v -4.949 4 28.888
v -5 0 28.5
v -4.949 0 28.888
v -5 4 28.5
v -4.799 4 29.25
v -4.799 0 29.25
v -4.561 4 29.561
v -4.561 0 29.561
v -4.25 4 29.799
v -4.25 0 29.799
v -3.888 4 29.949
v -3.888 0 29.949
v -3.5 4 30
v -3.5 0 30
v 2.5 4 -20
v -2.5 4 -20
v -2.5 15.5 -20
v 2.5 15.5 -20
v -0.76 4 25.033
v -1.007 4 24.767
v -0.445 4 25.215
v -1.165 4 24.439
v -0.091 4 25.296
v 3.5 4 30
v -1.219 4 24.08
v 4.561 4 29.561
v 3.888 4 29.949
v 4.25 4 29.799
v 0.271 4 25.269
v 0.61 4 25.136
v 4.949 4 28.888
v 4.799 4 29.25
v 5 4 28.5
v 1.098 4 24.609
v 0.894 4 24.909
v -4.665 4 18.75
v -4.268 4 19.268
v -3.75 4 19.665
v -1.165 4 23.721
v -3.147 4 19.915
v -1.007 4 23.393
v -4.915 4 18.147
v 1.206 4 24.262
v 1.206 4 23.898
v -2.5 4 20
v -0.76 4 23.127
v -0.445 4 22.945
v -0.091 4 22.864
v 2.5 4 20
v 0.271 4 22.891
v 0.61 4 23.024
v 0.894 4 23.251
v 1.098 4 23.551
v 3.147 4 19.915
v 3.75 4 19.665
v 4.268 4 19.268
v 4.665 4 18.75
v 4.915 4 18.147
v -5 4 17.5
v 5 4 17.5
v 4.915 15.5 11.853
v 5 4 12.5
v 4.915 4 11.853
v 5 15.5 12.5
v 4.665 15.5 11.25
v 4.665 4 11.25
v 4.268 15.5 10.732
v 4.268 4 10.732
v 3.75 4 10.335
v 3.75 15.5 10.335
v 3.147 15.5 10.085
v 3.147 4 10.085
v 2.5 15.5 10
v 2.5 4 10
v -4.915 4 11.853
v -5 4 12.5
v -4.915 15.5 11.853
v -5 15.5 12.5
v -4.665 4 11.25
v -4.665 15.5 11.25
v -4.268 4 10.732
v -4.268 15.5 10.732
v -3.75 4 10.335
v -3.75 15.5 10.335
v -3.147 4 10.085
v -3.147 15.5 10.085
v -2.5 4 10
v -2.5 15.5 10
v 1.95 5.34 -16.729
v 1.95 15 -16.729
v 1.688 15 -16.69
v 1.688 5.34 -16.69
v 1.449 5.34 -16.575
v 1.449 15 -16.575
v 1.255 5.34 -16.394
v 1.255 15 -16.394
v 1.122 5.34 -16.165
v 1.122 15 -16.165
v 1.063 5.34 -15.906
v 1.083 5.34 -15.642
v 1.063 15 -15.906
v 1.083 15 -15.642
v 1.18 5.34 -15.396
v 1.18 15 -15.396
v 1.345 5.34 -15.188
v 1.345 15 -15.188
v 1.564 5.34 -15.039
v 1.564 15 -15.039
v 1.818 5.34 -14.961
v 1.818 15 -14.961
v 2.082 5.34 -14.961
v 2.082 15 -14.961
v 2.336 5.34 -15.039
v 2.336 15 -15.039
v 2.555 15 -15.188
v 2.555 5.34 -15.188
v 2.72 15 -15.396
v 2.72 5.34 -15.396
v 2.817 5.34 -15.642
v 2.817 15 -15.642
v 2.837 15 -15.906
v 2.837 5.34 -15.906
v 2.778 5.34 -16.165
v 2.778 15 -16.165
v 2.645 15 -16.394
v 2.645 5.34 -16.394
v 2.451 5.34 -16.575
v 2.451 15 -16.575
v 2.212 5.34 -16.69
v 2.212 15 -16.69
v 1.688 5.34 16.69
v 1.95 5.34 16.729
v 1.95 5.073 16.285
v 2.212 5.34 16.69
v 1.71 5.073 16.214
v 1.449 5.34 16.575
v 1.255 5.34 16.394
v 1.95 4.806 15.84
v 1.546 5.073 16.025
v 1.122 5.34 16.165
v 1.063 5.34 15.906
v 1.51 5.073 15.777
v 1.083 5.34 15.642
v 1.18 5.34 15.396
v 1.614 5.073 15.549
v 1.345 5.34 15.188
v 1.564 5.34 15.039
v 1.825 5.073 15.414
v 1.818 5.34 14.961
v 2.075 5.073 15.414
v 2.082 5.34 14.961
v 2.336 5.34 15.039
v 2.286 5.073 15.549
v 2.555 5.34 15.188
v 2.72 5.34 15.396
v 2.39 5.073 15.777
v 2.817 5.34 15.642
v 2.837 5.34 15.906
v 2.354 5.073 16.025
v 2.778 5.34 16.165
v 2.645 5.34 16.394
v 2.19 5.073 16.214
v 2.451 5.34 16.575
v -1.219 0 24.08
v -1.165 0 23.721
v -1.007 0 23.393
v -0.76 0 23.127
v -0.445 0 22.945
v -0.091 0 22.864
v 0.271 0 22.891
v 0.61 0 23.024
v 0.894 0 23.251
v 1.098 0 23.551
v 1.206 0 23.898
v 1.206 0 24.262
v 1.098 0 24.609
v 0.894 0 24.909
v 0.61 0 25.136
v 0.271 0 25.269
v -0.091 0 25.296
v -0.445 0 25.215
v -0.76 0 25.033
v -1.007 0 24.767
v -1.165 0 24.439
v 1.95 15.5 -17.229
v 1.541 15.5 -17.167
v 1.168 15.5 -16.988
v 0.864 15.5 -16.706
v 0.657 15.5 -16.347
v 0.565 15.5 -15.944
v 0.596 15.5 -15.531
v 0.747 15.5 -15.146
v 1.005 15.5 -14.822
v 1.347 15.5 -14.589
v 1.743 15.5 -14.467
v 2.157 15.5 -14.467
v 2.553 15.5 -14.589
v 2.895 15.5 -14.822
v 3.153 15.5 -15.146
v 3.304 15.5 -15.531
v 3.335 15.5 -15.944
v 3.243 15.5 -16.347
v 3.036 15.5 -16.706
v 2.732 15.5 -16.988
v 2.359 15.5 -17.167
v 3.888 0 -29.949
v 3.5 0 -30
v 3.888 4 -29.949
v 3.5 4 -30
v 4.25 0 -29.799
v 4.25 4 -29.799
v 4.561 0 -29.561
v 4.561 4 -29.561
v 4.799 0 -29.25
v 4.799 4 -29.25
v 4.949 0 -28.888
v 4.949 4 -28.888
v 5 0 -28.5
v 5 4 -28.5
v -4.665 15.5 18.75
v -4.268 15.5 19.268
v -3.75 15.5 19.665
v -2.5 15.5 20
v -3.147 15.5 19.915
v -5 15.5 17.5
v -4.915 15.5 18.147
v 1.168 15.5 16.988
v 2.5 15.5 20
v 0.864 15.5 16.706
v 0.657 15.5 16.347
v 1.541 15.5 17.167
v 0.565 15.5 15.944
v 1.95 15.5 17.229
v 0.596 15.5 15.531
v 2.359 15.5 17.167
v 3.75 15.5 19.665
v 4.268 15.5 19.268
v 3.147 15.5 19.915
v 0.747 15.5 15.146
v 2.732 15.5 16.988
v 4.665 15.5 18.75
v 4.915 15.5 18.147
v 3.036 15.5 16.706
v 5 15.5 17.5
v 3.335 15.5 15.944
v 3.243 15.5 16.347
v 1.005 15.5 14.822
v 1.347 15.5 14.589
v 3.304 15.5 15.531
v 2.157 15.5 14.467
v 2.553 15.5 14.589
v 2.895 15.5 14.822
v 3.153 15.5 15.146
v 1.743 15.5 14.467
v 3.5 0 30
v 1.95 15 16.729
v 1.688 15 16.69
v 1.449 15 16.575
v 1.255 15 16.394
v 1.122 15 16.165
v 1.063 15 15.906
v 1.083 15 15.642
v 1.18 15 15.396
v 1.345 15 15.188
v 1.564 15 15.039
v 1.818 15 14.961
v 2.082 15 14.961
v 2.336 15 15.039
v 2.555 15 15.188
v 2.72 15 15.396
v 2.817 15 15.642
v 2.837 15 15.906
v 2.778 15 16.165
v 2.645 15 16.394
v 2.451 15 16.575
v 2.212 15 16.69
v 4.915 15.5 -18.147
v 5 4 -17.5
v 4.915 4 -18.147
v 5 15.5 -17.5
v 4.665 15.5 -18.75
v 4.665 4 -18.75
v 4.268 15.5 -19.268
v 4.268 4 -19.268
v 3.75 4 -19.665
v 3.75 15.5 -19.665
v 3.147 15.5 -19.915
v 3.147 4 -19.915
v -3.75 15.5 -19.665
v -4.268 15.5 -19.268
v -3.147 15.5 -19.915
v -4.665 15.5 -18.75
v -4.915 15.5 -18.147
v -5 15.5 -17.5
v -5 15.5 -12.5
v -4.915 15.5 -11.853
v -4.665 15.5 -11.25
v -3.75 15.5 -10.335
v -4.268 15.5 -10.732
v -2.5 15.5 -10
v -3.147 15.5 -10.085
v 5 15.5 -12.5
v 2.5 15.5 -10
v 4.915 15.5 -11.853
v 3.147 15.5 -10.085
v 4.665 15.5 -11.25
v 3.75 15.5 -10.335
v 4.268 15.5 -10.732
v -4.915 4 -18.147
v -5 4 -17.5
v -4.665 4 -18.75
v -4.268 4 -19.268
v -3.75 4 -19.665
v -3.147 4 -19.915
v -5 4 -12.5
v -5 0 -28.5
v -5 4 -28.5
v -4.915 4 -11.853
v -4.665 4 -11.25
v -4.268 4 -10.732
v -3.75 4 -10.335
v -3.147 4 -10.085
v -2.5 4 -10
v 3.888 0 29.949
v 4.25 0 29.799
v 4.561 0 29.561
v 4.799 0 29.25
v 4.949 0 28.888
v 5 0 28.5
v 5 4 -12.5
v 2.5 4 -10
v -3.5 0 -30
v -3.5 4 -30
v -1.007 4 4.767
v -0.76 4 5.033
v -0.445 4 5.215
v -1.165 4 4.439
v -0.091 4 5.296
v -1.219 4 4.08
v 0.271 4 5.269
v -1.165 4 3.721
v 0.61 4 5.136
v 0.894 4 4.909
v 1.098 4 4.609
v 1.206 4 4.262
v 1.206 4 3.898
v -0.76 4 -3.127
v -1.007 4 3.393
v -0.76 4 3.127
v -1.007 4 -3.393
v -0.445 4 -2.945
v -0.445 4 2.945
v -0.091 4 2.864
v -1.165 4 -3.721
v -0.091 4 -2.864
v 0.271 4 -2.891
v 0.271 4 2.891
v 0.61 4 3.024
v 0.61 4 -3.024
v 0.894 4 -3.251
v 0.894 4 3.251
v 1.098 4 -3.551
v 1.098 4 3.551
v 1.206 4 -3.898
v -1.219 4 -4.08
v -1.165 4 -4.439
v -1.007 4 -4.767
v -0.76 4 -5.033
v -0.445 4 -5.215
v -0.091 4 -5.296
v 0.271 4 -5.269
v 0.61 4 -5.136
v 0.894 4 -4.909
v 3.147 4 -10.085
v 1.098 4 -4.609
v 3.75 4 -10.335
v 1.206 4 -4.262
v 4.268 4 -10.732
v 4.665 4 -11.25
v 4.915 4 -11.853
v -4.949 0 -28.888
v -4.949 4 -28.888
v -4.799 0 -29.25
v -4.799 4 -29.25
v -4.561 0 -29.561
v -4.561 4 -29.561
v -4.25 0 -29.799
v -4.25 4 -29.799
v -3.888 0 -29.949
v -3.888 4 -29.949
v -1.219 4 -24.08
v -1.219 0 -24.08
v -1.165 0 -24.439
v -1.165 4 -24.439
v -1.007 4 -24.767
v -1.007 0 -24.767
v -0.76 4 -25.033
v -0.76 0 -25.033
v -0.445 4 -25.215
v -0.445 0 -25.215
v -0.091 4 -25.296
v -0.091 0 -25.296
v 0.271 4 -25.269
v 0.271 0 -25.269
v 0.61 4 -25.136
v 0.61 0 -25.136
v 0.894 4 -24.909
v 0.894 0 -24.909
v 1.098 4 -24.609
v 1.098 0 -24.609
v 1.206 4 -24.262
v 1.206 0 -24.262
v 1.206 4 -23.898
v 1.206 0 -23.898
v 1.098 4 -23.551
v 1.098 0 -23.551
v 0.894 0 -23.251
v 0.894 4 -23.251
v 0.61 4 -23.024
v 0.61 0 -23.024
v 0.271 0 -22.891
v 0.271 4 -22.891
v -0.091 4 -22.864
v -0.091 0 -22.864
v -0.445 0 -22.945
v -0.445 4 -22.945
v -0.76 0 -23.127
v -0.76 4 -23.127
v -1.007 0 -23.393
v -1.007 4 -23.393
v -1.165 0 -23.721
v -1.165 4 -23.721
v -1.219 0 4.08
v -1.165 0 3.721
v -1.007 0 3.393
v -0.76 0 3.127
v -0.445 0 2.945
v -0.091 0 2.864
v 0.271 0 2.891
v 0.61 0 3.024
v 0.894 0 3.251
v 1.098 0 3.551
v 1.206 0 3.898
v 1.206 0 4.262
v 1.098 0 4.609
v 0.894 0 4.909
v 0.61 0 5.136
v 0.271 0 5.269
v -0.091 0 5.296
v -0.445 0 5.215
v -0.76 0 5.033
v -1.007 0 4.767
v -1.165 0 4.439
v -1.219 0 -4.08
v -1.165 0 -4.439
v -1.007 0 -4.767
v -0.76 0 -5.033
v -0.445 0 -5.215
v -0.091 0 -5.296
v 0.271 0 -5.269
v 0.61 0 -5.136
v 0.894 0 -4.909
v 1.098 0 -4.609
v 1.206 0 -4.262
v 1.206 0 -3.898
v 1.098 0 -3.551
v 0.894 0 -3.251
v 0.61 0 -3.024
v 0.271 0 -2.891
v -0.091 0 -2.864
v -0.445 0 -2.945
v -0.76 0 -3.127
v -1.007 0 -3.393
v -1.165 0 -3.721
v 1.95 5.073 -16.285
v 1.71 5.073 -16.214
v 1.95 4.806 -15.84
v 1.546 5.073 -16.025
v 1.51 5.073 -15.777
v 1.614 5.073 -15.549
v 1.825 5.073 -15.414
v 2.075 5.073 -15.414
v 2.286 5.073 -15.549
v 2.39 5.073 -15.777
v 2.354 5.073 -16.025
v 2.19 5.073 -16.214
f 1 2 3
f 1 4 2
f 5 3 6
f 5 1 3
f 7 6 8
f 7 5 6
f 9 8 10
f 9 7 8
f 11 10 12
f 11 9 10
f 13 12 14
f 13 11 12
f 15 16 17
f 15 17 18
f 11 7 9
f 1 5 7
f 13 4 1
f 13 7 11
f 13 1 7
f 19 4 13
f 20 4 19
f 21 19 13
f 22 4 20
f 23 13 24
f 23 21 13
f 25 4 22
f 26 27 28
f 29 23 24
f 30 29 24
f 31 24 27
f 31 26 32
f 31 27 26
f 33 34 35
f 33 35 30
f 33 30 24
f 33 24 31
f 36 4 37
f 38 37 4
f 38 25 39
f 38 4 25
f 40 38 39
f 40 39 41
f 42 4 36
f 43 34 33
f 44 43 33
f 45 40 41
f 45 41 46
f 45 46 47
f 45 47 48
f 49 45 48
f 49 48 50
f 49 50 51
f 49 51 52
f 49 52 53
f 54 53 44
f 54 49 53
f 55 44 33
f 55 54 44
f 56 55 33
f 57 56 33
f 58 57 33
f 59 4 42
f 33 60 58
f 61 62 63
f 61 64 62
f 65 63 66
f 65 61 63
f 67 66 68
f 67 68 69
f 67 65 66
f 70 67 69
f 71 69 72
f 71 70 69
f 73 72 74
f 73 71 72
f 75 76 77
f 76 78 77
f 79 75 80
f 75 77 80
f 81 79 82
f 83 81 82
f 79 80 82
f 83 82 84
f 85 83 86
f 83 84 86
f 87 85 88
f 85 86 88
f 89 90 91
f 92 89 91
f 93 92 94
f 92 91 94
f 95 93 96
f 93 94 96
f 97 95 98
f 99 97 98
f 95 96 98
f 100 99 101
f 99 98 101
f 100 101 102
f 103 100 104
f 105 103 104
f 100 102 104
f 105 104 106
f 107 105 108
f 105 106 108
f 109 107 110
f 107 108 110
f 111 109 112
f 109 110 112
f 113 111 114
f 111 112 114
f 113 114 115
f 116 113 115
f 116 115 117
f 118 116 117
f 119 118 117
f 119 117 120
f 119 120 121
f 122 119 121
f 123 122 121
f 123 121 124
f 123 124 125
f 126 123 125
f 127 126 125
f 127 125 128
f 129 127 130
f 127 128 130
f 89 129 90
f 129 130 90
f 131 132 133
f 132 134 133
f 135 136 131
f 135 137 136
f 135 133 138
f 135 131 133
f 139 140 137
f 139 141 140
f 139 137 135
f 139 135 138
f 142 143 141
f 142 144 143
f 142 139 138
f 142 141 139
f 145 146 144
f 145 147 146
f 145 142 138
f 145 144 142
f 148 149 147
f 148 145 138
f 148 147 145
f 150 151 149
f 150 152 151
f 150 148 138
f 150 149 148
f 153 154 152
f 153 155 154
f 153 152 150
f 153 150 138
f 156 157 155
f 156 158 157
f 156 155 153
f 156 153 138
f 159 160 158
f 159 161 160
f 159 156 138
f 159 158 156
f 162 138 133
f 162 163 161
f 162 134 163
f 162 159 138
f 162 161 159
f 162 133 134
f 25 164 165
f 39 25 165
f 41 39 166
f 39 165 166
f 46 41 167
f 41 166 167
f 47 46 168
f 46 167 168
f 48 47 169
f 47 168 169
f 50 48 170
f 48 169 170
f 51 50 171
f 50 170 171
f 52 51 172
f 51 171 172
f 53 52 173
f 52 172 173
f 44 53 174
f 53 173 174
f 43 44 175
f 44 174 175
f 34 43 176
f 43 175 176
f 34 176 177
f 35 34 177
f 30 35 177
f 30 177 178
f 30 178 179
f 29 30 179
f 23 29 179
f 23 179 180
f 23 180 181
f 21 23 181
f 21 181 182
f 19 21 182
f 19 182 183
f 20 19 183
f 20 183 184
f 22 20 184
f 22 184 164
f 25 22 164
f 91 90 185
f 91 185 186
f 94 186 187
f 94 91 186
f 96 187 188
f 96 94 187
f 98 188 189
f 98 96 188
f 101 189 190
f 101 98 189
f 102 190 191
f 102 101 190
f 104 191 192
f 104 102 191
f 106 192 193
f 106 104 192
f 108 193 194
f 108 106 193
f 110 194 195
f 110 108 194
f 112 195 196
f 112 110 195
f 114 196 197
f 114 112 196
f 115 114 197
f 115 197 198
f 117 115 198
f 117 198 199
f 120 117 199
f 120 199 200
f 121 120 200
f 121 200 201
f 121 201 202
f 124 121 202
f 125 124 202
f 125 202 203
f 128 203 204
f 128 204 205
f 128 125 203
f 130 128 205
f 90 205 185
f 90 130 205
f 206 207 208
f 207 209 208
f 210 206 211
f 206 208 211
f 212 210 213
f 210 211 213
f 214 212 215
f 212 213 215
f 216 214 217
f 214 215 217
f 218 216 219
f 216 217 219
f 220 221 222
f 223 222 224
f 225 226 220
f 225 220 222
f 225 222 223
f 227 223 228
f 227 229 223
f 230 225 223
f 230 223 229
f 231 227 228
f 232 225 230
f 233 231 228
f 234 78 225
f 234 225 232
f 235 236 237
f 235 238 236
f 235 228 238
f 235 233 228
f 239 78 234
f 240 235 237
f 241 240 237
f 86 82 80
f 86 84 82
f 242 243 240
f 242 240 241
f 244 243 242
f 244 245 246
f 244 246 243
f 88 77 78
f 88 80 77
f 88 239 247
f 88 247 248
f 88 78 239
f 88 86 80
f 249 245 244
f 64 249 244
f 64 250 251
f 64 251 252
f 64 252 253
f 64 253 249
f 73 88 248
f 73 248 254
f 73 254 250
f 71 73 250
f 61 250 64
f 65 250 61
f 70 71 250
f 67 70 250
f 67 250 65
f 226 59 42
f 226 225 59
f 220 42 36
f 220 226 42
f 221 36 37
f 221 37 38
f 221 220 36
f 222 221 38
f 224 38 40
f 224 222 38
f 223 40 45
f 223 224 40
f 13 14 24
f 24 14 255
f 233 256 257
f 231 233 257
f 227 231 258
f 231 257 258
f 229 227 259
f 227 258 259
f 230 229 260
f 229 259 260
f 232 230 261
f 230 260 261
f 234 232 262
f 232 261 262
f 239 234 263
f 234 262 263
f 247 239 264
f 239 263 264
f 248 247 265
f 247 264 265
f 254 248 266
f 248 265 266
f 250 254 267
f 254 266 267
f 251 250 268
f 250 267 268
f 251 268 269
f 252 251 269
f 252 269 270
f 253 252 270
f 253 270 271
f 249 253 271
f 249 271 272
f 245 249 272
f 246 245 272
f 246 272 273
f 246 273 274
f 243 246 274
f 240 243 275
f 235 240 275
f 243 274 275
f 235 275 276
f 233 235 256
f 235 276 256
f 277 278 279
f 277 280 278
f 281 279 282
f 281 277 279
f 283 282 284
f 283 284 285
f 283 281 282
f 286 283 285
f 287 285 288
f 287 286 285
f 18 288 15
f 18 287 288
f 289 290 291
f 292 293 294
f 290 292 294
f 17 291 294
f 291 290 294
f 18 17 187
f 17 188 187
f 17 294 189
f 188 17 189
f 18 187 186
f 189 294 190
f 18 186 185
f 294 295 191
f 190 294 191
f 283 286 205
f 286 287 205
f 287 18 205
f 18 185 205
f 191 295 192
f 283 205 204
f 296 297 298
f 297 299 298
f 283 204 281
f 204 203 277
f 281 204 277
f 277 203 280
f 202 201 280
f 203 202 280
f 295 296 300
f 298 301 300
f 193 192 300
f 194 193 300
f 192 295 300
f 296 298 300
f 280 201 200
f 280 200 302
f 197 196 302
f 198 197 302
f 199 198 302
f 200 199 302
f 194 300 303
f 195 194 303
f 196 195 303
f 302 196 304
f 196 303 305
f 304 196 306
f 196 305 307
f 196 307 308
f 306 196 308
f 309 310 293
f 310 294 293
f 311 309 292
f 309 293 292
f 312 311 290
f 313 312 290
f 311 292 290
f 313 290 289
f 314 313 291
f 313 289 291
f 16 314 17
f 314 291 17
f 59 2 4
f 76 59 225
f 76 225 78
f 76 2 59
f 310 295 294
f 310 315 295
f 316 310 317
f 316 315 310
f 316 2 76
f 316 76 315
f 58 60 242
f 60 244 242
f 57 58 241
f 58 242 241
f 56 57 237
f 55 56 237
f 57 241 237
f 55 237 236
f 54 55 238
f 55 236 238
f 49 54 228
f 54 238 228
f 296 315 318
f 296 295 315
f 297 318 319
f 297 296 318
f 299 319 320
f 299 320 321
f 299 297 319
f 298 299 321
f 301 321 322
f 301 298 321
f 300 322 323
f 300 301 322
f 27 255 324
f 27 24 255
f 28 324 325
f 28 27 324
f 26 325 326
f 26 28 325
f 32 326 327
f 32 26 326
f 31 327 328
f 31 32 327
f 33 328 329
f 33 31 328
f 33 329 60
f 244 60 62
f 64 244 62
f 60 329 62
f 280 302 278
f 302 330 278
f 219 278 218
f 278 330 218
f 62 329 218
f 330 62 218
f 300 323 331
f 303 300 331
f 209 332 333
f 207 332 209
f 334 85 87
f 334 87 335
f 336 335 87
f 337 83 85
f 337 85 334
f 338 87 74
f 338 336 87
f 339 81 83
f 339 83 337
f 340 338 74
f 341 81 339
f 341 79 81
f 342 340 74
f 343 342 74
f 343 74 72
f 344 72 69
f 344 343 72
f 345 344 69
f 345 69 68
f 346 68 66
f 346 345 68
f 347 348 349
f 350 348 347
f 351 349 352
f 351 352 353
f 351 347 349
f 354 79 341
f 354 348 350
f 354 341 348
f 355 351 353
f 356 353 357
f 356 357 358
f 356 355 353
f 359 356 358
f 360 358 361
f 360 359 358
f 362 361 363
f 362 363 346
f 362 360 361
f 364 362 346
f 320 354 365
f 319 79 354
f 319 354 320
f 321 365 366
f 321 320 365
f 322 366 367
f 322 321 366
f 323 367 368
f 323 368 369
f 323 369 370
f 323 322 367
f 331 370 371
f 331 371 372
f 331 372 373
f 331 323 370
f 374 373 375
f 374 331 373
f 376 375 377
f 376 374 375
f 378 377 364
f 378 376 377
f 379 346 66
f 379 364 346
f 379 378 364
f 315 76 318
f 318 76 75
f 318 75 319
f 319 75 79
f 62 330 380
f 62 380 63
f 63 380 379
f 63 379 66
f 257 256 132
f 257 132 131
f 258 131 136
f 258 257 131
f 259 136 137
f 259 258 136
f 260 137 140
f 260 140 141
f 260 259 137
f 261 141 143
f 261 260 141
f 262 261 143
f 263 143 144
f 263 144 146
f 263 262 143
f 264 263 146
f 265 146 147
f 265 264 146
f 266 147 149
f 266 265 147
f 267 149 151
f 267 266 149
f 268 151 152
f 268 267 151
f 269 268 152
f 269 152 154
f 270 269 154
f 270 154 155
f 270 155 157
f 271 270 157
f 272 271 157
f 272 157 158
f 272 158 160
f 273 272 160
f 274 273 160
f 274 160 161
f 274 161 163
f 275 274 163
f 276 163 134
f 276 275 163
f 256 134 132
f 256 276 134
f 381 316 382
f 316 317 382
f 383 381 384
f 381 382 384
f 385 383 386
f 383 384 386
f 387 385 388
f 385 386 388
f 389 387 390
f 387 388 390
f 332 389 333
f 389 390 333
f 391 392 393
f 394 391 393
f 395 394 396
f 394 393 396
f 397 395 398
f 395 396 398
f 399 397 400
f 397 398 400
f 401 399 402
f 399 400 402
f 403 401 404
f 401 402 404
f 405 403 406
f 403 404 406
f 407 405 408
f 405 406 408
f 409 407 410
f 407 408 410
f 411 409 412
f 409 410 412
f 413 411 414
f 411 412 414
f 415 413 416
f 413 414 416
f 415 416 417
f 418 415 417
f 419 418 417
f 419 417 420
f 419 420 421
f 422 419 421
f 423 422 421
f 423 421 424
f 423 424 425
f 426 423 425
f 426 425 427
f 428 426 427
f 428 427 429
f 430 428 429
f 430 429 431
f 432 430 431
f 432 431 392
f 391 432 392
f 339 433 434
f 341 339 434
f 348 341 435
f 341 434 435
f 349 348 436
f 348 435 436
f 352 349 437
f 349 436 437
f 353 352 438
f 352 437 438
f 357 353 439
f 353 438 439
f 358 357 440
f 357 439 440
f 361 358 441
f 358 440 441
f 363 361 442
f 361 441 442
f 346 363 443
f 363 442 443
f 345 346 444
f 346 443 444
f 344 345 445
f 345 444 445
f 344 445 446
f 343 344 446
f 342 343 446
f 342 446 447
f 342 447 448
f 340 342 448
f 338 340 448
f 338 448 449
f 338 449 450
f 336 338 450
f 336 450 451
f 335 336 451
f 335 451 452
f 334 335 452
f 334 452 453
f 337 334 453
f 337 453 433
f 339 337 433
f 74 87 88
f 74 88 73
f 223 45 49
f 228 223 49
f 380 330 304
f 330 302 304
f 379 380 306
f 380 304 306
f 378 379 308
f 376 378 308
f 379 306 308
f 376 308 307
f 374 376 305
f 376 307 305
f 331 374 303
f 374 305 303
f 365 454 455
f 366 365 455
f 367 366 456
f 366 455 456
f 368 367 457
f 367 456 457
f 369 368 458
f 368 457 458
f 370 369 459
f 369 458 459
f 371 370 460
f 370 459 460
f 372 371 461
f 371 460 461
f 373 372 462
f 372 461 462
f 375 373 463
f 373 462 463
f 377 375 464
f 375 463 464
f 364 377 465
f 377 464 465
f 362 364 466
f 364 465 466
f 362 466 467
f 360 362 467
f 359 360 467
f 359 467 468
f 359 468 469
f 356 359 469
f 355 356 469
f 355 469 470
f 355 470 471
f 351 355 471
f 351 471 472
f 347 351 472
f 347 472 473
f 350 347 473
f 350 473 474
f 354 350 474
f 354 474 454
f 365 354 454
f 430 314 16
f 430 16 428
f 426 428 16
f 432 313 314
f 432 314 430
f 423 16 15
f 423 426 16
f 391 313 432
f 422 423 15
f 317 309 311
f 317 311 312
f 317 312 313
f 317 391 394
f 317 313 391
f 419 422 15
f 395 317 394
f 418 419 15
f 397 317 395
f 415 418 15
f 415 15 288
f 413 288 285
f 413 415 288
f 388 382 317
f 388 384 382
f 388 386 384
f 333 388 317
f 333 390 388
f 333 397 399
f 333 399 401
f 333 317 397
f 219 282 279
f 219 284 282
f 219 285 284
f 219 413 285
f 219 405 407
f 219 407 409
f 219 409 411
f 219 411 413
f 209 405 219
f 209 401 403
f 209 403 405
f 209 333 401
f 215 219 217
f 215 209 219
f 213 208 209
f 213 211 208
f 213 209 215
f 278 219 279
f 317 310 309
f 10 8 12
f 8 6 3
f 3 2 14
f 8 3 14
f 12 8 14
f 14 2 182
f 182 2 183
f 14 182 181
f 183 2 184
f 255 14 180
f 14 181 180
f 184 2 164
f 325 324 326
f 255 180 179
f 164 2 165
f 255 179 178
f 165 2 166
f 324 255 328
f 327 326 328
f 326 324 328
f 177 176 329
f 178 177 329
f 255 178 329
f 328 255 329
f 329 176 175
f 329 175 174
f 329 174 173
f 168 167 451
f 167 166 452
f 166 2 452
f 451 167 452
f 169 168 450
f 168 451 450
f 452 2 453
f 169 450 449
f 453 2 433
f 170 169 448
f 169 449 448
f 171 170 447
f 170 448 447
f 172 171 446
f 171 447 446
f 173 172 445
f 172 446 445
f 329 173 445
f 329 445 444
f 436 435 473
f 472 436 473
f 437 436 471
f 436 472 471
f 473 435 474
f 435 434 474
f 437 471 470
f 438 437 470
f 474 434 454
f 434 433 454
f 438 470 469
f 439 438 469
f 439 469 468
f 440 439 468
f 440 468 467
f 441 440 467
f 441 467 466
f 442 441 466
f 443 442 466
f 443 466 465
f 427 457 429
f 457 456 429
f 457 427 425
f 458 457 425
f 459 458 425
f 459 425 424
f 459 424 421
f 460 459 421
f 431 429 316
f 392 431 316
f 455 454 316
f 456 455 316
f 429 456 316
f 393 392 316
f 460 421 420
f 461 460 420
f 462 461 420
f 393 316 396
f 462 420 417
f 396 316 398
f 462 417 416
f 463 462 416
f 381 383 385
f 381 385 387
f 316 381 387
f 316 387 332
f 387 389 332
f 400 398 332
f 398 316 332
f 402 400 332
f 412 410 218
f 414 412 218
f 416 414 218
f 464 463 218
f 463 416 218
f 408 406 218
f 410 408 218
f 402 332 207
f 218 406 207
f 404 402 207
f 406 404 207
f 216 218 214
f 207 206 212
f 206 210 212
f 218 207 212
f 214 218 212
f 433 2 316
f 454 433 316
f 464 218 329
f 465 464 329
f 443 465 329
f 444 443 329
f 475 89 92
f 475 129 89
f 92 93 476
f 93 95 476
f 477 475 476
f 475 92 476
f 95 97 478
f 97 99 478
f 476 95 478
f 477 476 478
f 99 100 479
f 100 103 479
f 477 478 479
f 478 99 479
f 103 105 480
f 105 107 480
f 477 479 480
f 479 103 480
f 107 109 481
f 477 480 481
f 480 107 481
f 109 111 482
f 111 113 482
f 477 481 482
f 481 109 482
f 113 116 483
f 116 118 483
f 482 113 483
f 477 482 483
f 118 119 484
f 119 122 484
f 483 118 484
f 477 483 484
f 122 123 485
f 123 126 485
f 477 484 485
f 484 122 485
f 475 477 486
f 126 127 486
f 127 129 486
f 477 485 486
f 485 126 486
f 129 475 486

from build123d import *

# Parameters (mm, degrees)
SKETCH1_W                = 10
SKETCH1_H                = 60
BOSS_EXTRUDE1_DEPTH      = 4
F_2_CLEARANCE_HOLE1_D    = 2.4384
FILLET1_R                = 1.5
SKETCH4_W                = 10
SKETCH4_H                = 10
BOSS_EXTRUDE2_DEPTH      = 11.5
FILLET2_R                = 2.5
CHAMFER1_SIZE            = 0.5
FILLET2_OF_MIRROR1_R     = 2.5
CHAMFER1_OF_MIRROR1_SIZE = 0.5


with BuildPart() as part:
    # Sketch1 → Boss-Extrude1 (new body)
    with BuildSketch(Plane(origin=(0, 0, 0), x_dir=(1, 0, 0), z_dir=(0, 1, 0))):
        Rectangle(SKETCH1_W, SKETCH1_H)
    extrude(amount=BOSS_EXTRUDE1_DEPTH)

    # #2 Clearance Hole1 (through all)
    with Locations(Plane(origin=(0, 4, 0), x_dir=(1, 0, 0), z_dir=(0, 1, 0))):
        with Locations((0, -4.08), (0, 24.08), (0, 4.08), (0, -24.08)):
            Hole(F_2_CLEARANCE_HOLE1_D / 2)

    # Fillet1
    fillet1_edges = [part.edges().sort_by_distance(p)[0] for p in [
        (5, 2, 30),
        (-5, 2, 30),
        (-5, 2, -30),
        (5, 2, -30),
    ]]
    fillet(fillet1_edges, radius=FILLET1_R)

    # Sketch4 → Boss-Extrude2 (add)
    with BuildSketch(Plane(origin=(0, 4, 0), x_dir=(1, 0, 0), z_dir=(0, 1, 0))):
        with Locations((0, -15)):
            Rectangle(SKETCH4_W, SKETCH4_H)
    boss_extrude2 = extrude(amount=BOSS_EXTRUDE2_DEPTH)

    # Fillet2
    fillet2_edges = [part.edges().sort_by_distance(p)[0] for p in [
        (-5, 9.75, 10),
        (-5, 9.75, 20),
        (5, 9.75, 20),
        (5, 9.75, 10),
    ]]
    fillet(fillet2_edges, radius=FILLET2_R)

    # Sketch6 → Tap Drill for #2-56 Tap1 (revolve, cut)
    with BuildSketch(Plane(origin=(1.95, 15.5, 15.84), x_dir=(0, 0, 1), z_dir=(1, 0, 0))):
        Polygon((0, 0), (0, 10.69416509), (0.889, 10.16), (0.889, 0), align=None)
    tap_drill_for_2_56_tap1 = revolve(axis=Axis((1.95, 21.85, 15.84), (0, -1, 0)), mode=Mode.SUBTRACT)

    # Chamfer1
    chamfer1_edges = [part.edges().sort_by_distance(p)[0] for p in [
        (1.95, 15.5, 14.951),
    ]]
    chamfer(chamfer1_edges, length=CHAMFER1_SIZE)

    # Mirror1: Boss-Extrude2, Tap Drill for #2-56 Tap1 across plane
    add(boss_extrude2.mirror(Plane.XY))
    add(tap_drill_for_2_56_tap1.mirror(Plane.XY), mode=Mode.SUBTRACT)

    # Fillet2 of Mirror1
    fillet2_of_mirror1_edges = [part.edges().sort_by_distance(p)[0] for p in [
        (-5, 9.75, -10),
        (-5, 9.75, -20),
        (5, 9.75, -20),
        (5, 9.75, -10),
    ]]
    fillet(fillet2_of_mirror1_edges, radius=FILLET2_OF_MIRROR1_R)

    # Chamfer1 of Mirror1
    chamfer1_of_mirror1_edges = [part.edges().sort_by_distance(p)[0] for p in [
        (1.95, 15.5, -14.951),
    ]]
    chamfer(chamfer1_of_mirror1_edges, length=CHAMFER1_OF_MIRROR1_SIZE)


solid = part.part
